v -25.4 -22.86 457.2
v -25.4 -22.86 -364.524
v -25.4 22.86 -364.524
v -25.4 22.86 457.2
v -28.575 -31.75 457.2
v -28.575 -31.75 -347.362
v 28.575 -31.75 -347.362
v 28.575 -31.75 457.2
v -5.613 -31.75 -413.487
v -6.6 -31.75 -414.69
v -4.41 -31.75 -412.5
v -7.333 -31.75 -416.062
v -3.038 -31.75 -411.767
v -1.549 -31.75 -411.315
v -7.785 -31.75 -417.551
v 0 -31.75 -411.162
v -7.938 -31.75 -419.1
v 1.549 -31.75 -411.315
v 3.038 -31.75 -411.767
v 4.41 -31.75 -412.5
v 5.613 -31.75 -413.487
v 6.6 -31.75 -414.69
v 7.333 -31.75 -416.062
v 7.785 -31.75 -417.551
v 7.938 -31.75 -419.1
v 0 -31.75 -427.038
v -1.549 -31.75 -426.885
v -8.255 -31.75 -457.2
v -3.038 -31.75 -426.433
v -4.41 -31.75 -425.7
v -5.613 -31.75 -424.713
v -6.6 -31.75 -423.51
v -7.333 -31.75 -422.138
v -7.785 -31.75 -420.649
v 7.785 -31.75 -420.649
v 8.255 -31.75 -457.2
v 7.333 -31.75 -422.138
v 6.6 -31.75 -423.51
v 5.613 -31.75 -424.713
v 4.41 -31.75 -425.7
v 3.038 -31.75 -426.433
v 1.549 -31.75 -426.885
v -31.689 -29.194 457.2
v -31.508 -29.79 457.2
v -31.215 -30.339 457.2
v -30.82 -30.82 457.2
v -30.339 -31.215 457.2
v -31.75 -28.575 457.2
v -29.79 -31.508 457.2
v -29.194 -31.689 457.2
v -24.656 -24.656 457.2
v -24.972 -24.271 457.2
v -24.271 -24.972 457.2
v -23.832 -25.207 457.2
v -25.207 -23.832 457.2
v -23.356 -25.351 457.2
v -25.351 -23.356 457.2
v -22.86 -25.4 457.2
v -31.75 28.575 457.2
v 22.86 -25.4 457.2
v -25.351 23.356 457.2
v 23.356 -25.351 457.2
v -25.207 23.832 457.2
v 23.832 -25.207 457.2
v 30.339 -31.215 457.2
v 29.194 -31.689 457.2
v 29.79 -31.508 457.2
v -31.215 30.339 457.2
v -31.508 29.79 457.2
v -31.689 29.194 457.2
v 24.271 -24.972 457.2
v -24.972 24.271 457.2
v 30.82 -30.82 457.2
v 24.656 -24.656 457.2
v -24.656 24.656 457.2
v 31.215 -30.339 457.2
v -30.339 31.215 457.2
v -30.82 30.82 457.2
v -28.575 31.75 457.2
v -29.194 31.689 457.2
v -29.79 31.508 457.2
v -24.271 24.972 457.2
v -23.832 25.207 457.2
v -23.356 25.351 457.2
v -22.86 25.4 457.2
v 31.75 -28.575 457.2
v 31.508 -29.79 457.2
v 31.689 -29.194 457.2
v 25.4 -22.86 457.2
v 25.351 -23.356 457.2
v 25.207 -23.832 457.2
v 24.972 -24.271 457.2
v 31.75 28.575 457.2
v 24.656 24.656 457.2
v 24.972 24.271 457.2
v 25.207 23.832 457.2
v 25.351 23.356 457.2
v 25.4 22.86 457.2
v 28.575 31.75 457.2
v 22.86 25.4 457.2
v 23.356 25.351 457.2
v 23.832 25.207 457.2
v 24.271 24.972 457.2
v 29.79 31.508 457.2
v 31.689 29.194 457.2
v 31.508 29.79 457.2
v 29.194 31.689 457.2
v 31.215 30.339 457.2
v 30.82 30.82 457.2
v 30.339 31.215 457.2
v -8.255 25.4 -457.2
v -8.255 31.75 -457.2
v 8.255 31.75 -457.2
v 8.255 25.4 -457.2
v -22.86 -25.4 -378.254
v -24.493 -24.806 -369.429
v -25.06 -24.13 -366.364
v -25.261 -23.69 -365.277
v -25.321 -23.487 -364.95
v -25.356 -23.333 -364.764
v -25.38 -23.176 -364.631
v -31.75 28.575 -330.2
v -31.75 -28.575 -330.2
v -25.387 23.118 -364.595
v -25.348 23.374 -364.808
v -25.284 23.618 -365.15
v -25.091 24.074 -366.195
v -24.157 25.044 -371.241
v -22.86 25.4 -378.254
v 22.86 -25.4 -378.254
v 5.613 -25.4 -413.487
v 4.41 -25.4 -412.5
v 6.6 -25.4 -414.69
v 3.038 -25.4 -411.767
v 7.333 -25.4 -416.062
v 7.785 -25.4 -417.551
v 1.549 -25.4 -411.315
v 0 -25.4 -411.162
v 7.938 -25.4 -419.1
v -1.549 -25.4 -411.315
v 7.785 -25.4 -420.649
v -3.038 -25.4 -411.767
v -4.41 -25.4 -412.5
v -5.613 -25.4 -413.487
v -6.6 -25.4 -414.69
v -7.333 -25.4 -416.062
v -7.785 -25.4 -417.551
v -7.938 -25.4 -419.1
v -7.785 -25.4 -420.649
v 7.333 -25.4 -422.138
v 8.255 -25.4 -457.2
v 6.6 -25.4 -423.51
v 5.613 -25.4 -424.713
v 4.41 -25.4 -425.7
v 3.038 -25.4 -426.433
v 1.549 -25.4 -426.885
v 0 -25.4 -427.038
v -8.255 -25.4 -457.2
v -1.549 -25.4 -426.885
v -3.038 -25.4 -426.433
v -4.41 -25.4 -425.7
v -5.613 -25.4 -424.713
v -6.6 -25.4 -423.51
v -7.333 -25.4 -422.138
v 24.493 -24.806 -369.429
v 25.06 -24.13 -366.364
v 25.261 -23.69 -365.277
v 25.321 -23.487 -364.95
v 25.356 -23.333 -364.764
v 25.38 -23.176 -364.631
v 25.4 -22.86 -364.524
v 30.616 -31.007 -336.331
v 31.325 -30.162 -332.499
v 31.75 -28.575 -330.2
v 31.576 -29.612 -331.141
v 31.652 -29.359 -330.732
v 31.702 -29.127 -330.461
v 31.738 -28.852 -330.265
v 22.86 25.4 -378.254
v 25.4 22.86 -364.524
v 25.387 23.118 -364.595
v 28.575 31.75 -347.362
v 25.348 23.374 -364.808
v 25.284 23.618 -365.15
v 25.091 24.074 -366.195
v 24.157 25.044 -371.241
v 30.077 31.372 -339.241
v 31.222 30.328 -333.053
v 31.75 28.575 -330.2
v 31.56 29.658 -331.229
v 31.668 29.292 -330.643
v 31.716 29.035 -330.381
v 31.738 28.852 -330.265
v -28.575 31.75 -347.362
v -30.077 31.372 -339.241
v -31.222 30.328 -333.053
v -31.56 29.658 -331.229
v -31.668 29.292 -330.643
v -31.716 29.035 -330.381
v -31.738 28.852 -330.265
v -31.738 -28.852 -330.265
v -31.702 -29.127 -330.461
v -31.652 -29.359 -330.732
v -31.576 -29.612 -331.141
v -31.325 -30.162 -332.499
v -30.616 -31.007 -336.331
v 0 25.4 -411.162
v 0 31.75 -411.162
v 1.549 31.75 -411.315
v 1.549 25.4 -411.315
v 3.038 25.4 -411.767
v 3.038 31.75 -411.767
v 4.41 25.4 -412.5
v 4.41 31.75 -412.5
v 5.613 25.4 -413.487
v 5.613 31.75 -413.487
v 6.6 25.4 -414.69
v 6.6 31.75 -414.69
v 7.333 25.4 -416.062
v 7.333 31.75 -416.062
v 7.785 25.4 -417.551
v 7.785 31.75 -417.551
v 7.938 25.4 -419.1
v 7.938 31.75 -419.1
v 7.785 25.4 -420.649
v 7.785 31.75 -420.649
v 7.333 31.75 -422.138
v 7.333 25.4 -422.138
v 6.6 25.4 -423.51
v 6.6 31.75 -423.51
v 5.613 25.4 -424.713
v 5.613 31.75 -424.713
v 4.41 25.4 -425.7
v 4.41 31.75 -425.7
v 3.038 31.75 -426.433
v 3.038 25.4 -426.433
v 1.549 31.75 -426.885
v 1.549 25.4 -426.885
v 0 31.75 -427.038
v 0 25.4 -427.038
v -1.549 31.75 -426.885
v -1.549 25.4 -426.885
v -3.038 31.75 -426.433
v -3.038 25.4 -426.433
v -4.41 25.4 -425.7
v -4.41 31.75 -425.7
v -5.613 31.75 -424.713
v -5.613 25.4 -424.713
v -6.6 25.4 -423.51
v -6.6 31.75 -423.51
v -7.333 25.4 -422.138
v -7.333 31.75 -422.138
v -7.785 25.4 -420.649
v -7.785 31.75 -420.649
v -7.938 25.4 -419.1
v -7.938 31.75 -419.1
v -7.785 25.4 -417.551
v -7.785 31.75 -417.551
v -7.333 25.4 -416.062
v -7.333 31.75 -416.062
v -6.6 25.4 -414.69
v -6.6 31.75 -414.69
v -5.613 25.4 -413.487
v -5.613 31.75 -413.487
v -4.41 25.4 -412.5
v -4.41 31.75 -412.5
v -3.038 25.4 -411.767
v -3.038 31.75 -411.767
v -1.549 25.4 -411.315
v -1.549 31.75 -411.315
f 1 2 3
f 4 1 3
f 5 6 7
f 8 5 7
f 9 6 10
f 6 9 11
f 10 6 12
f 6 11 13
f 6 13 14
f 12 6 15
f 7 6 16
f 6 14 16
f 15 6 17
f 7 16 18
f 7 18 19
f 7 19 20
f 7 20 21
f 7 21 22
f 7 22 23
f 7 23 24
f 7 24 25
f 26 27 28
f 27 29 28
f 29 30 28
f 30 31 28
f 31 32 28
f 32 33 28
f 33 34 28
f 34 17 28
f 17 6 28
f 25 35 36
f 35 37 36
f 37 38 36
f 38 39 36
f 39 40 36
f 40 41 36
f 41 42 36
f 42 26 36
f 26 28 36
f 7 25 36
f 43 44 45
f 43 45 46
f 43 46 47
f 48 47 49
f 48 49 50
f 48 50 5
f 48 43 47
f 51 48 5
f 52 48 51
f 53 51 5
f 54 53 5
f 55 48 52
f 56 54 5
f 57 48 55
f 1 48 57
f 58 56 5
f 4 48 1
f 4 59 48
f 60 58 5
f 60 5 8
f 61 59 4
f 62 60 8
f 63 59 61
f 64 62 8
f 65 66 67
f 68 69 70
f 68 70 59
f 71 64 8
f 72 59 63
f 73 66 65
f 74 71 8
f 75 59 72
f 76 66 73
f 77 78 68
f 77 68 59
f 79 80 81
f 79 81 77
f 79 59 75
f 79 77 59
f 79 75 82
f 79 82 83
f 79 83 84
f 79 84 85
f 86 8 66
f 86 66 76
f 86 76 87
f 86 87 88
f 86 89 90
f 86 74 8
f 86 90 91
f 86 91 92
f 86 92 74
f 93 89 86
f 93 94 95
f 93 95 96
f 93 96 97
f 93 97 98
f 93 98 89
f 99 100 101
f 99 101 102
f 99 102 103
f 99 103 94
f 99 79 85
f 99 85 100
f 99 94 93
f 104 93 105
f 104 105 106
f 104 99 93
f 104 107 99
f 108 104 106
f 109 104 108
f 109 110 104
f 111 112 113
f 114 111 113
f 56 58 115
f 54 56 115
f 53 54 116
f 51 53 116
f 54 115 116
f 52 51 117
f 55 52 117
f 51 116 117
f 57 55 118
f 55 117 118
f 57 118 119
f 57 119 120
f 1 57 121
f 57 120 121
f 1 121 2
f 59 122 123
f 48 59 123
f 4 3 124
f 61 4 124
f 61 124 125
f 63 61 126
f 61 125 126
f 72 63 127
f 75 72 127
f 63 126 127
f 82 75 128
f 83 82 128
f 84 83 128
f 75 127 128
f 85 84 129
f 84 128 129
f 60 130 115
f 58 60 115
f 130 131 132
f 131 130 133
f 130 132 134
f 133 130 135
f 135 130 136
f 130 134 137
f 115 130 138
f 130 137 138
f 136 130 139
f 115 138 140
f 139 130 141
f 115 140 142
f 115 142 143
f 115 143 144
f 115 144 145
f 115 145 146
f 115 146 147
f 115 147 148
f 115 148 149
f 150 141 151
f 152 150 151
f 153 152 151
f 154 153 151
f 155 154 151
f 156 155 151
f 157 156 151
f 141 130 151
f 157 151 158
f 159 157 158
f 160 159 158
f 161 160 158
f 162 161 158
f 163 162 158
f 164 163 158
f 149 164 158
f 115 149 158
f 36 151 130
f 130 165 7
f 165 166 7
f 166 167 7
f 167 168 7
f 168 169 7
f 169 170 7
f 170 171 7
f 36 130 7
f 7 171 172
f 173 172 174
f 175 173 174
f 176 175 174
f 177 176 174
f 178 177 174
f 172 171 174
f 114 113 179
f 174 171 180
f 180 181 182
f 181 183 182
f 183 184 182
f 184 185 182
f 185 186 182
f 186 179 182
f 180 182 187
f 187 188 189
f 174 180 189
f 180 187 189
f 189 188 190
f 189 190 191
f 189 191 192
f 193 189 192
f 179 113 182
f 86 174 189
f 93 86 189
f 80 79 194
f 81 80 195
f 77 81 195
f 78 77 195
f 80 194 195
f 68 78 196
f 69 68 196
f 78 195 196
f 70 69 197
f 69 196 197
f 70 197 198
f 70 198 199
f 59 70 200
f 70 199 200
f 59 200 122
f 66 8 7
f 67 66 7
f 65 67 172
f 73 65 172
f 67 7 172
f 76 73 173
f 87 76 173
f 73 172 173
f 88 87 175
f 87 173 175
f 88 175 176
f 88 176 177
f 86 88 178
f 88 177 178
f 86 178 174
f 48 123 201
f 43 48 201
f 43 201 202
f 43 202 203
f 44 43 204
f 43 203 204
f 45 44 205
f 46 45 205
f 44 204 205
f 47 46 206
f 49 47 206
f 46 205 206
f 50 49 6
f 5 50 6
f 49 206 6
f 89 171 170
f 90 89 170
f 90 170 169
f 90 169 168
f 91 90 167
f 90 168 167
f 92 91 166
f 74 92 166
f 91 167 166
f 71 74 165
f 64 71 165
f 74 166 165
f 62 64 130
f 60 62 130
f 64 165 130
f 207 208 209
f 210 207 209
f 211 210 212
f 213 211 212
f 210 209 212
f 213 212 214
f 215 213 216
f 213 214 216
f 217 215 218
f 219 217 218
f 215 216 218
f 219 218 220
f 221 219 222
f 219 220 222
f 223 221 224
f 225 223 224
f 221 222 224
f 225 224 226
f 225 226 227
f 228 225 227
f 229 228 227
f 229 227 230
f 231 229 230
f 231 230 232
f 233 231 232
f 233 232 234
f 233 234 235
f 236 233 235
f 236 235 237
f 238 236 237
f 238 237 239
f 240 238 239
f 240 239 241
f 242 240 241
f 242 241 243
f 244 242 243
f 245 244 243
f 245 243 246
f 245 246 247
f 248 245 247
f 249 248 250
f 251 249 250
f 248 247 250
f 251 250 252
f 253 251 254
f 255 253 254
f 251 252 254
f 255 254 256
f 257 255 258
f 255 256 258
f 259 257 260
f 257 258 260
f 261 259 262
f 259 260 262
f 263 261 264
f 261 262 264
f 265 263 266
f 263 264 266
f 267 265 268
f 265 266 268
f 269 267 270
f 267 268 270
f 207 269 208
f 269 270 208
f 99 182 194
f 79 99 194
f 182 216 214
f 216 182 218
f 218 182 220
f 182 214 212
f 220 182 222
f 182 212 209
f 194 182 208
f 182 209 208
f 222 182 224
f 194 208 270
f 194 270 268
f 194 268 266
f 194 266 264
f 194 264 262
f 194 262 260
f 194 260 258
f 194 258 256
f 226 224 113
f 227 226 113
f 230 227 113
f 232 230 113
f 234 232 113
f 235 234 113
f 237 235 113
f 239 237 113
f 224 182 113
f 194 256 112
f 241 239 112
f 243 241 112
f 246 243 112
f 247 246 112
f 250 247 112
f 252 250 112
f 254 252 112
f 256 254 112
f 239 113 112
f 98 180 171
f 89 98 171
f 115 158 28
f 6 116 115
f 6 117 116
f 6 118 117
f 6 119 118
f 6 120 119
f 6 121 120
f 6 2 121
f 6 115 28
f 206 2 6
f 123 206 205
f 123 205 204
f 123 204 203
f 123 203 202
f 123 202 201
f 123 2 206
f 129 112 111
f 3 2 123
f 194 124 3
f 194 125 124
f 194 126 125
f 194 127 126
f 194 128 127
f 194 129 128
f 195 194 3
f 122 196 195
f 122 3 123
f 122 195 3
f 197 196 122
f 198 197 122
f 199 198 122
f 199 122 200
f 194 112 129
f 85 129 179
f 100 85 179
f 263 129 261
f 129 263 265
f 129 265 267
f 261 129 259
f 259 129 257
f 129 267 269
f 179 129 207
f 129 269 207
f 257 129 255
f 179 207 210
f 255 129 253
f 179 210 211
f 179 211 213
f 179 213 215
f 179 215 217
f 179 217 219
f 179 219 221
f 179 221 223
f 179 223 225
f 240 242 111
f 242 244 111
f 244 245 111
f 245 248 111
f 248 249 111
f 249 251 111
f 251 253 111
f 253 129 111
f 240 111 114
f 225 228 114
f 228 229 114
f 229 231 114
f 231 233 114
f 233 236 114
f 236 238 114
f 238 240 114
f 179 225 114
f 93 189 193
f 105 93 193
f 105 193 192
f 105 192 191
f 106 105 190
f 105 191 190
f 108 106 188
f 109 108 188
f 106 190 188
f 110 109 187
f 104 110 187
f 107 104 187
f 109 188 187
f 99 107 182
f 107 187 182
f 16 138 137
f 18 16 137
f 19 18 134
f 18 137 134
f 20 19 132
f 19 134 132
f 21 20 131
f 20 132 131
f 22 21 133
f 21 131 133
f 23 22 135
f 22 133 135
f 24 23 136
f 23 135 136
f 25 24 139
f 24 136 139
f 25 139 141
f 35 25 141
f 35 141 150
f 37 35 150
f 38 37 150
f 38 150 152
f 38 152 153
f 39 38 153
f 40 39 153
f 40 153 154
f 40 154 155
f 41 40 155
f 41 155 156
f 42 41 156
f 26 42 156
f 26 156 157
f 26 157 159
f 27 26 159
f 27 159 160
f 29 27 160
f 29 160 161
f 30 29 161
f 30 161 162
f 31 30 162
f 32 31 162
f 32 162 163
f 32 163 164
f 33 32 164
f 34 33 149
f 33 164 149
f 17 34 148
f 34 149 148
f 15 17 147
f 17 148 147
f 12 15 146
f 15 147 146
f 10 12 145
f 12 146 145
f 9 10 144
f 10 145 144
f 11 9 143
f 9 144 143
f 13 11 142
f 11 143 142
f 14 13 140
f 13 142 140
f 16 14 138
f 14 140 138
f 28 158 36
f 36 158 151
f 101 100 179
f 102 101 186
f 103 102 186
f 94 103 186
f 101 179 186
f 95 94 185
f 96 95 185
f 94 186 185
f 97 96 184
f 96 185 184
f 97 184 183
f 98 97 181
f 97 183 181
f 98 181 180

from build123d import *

# Parameters (mm, degrees)
BOSS_EXTRUDE1_DEPTH      = 457.2
BOSS_EXTRUDE1_DEPTH_BACK = 457.2
SKETCH6_R                = 7.9375
CUT_EXTRUDE1_DEPTH       = 463.679319291


with BuildPart() as part:
    # Sketch4 → Boss-Extrude1 (new, two sides: drawn at the far end of the back side and taken through both)
    with BuildSketch(Plane.XY.offset(-BOSS_EXTRUDE1_DEPTH_BACK)):
        with BuildLine():
            Line((31.75, -28.575), (31.75, 28.575))
            ThreePointArc((31.75, 28.575), (30.82006403, 30.82006403), (28.575, 31.75))
            Line((28.575, 31.75), (-28.575, 31.75))
            ThreePointArc((-28.575, 31.75), (-30.82006403, 30.82006403), (-31.75, 28.575))
            Line((-31.75, 28.575), (-31.75, -28.575))
            ThreePointArc((-31.75, -28.575), (-30.82006403, -30.82006403), (-28.575, -31.75))
            Line((-28.575, -31.75), (28.575, -31.75))
            ThreePointArc((28.575, -31.75), (30.82006403, -30.82006403), (31.75, -28.575))
        make_face()
        with BuildLine():
            Line((25.4, 22.86), (25.4, -22.86))
            ThreePointArc((25.4, -22.86), (24.656051224, -24.656051224), (22.86, -25.4))
            Line((22.86, -25.4), (-22.86, -25.4))
            ThreePointArc((-22.86, -25.4), (-24.656051224, -24.656051224), (-25.4, -22.86))
            Line((-25.4, -22.86), (-25.4, 22.86))
            ThreePointArc((-25.4, 22.86), (-24.656051224, 24.656051224), (-22.86, 25.4))
            Line((-22.86, 25.4), (22.86, 25.4))
            ThreePointArc((22.86, 25.4), (24.656051224, 24.656051224), (25.4, 22.86))
        make_face(mode=Mode.SUBTRACT)
    extrude(amount=BOSS_EXTRUDE1_DEPTH + BOSS_EXTRUDE1_DEPTH_BACK)

    # Sketch6 → Cut-Extrude1 (cut, through all)
    with BuildSketch(Plane(origin=(0, 31.75, 0), x_dir=(1, 0, 0), z_dir=(0, 1, 0))):
        with Locations(Location((0, 419.1, 0), (0, 0, 270))):
            Circle(SKETCH6_R)
        Polygon((8.255, 457.2), (31.75, 330.2), (31.75, 457.2), align=None)
        Polygon((-8.255, 457.2), (-31.75, 330.2), (-31.75, 457.2), align=None)
    extrude(amount=-CUT_EXTRUDE1_DEPTH, mode=Mode.SUBTRACT)


solid = part.part
